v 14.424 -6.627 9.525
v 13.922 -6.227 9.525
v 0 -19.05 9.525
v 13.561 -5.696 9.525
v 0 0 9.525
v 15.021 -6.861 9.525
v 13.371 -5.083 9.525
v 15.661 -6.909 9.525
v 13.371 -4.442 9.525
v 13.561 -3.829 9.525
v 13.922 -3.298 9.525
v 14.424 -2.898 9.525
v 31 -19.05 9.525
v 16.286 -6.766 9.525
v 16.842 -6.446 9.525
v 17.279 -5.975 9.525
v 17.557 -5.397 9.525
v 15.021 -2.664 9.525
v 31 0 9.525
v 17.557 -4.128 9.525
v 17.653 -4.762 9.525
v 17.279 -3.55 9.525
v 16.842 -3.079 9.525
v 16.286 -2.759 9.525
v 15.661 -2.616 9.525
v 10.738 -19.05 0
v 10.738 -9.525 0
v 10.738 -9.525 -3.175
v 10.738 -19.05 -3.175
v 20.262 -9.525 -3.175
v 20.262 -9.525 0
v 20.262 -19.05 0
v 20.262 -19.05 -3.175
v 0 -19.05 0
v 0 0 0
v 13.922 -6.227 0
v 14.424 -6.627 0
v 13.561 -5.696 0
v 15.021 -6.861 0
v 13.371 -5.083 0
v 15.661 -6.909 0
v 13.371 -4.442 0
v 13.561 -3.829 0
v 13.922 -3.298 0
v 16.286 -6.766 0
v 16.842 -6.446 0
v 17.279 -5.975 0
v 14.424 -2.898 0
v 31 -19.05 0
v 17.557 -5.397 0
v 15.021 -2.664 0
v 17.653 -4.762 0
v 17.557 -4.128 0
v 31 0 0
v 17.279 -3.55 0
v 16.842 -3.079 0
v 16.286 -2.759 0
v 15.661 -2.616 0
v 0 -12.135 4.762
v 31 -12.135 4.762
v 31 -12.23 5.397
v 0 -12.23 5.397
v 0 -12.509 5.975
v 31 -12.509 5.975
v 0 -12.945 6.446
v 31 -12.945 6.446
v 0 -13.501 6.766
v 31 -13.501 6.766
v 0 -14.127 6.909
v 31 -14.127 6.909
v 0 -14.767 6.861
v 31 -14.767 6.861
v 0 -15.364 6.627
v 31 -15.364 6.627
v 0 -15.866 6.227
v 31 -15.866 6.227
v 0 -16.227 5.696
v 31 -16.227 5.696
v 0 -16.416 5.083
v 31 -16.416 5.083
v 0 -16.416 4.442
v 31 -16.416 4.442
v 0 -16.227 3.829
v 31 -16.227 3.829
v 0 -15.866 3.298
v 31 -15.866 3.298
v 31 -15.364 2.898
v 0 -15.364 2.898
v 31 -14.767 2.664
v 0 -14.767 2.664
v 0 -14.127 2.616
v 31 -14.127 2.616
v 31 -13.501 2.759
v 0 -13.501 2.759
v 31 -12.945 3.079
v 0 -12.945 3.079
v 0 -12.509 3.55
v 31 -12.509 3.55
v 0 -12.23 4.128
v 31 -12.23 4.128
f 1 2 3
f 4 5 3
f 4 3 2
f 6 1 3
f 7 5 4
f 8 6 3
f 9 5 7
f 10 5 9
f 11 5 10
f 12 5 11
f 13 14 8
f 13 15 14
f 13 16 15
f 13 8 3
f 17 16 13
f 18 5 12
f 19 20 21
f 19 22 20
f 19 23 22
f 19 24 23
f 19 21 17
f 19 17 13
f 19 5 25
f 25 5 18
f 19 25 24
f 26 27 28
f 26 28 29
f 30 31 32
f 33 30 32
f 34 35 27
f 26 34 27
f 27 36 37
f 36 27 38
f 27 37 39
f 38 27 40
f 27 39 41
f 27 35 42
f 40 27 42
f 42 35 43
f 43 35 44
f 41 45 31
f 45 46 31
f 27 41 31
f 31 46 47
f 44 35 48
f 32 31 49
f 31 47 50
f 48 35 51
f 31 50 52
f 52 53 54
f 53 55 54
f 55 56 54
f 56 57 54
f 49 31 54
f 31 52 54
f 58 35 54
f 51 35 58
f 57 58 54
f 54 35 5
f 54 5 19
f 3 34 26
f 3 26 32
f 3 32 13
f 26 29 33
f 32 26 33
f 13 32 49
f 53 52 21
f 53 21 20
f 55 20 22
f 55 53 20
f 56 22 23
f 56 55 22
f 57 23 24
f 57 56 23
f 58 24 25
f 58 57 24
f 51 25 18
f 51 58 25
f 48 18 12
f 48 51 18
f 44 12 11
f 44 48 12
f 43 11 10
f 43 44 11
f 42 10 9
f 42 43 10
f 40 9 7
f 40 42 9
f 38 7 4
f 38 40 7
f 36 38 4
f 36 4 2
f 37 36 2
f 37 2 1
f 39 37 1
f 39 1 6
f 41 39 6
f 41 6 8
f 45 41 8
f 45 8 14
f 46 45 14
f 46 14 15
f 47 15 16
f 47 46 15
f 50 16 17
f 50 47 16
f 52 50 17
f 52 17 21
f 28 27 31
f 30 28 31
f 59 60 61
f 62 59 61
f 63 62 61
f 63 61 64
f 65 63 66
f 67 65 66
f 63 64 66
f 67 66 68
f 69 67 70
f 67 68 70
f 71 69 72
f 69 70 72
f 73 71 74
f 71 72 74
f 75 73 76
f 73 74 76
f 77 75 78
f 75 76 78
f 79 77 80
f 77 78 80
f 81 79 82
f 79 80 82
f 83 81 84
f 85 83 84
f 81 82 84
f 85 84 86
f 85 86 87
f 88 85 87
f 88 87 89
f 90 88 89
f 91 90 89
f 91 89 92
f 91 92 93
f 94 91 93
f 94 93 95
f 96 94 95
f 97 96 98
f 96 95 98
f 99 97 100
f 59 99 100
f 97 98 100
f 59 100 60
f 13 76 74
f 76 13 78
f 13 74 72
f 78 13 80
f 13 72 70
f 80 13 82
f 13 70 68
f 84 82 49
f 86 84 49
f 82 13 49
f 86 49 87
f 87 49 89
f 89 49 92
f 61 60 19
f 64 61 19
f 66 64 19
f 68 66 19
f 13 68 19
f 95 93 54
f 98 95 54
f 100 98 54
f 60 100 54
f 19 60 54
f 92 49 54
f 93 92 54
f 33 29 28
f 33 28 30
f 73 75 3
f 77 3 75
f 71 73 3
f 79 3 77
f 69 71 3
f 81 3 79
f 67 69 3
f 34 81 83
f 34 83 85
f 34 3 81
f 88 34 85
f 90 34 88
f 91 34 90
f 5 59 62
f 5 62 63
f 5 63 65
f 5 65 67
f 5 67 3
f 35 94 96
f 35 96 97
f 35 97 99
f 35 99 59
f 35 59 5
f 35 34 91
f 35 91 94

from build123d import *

# Parameters (mm, degrees)
F0_W     = 31
F0_H     = 19.05
F0_R     = 2.15265
F1_DEPTH = 9.525
F2_R     = 2.15265
F3_DEPTH = 31
F4_W     = 9.525
F4_H     = 9.525
F5_DEPTH = 3.175


with BuildPart() as f1:
    # F0 (on Top) → F1 (new body)
    with BuildSketch(Plane.XY):
        with Locations((15.5, -9.525)):
            Rectangle(F0_W, F0_H)
        with Locations((15.5, -4.7625)):
            Circle(F0_R, mode=Mode.SUBTRACT)
    extrude(amount=F1_DEPTH)

    # F2 (on face) → F3 (cut, through all)
    with BuildSketch(Plane.YZ.offset(31)):
        with Locations((-14.2875, 4.7625)):
            Circle(F2_R)
    extrude(amount=-F3_DEPTH, mode=Mode.SUBTRACT)

    # F4 (on face) → F5 (join)
    with BuildSketch(Plane(origin=(0, 0, 0), x_dir=(1, 0, 0), z_dir=(0, 0, -1))):
        with Locations((15.5, 14.2875)):
            Rectangle(F4_W, F4_H)
    extrude(amount=F5_DEPTH)


solid = f1.part
